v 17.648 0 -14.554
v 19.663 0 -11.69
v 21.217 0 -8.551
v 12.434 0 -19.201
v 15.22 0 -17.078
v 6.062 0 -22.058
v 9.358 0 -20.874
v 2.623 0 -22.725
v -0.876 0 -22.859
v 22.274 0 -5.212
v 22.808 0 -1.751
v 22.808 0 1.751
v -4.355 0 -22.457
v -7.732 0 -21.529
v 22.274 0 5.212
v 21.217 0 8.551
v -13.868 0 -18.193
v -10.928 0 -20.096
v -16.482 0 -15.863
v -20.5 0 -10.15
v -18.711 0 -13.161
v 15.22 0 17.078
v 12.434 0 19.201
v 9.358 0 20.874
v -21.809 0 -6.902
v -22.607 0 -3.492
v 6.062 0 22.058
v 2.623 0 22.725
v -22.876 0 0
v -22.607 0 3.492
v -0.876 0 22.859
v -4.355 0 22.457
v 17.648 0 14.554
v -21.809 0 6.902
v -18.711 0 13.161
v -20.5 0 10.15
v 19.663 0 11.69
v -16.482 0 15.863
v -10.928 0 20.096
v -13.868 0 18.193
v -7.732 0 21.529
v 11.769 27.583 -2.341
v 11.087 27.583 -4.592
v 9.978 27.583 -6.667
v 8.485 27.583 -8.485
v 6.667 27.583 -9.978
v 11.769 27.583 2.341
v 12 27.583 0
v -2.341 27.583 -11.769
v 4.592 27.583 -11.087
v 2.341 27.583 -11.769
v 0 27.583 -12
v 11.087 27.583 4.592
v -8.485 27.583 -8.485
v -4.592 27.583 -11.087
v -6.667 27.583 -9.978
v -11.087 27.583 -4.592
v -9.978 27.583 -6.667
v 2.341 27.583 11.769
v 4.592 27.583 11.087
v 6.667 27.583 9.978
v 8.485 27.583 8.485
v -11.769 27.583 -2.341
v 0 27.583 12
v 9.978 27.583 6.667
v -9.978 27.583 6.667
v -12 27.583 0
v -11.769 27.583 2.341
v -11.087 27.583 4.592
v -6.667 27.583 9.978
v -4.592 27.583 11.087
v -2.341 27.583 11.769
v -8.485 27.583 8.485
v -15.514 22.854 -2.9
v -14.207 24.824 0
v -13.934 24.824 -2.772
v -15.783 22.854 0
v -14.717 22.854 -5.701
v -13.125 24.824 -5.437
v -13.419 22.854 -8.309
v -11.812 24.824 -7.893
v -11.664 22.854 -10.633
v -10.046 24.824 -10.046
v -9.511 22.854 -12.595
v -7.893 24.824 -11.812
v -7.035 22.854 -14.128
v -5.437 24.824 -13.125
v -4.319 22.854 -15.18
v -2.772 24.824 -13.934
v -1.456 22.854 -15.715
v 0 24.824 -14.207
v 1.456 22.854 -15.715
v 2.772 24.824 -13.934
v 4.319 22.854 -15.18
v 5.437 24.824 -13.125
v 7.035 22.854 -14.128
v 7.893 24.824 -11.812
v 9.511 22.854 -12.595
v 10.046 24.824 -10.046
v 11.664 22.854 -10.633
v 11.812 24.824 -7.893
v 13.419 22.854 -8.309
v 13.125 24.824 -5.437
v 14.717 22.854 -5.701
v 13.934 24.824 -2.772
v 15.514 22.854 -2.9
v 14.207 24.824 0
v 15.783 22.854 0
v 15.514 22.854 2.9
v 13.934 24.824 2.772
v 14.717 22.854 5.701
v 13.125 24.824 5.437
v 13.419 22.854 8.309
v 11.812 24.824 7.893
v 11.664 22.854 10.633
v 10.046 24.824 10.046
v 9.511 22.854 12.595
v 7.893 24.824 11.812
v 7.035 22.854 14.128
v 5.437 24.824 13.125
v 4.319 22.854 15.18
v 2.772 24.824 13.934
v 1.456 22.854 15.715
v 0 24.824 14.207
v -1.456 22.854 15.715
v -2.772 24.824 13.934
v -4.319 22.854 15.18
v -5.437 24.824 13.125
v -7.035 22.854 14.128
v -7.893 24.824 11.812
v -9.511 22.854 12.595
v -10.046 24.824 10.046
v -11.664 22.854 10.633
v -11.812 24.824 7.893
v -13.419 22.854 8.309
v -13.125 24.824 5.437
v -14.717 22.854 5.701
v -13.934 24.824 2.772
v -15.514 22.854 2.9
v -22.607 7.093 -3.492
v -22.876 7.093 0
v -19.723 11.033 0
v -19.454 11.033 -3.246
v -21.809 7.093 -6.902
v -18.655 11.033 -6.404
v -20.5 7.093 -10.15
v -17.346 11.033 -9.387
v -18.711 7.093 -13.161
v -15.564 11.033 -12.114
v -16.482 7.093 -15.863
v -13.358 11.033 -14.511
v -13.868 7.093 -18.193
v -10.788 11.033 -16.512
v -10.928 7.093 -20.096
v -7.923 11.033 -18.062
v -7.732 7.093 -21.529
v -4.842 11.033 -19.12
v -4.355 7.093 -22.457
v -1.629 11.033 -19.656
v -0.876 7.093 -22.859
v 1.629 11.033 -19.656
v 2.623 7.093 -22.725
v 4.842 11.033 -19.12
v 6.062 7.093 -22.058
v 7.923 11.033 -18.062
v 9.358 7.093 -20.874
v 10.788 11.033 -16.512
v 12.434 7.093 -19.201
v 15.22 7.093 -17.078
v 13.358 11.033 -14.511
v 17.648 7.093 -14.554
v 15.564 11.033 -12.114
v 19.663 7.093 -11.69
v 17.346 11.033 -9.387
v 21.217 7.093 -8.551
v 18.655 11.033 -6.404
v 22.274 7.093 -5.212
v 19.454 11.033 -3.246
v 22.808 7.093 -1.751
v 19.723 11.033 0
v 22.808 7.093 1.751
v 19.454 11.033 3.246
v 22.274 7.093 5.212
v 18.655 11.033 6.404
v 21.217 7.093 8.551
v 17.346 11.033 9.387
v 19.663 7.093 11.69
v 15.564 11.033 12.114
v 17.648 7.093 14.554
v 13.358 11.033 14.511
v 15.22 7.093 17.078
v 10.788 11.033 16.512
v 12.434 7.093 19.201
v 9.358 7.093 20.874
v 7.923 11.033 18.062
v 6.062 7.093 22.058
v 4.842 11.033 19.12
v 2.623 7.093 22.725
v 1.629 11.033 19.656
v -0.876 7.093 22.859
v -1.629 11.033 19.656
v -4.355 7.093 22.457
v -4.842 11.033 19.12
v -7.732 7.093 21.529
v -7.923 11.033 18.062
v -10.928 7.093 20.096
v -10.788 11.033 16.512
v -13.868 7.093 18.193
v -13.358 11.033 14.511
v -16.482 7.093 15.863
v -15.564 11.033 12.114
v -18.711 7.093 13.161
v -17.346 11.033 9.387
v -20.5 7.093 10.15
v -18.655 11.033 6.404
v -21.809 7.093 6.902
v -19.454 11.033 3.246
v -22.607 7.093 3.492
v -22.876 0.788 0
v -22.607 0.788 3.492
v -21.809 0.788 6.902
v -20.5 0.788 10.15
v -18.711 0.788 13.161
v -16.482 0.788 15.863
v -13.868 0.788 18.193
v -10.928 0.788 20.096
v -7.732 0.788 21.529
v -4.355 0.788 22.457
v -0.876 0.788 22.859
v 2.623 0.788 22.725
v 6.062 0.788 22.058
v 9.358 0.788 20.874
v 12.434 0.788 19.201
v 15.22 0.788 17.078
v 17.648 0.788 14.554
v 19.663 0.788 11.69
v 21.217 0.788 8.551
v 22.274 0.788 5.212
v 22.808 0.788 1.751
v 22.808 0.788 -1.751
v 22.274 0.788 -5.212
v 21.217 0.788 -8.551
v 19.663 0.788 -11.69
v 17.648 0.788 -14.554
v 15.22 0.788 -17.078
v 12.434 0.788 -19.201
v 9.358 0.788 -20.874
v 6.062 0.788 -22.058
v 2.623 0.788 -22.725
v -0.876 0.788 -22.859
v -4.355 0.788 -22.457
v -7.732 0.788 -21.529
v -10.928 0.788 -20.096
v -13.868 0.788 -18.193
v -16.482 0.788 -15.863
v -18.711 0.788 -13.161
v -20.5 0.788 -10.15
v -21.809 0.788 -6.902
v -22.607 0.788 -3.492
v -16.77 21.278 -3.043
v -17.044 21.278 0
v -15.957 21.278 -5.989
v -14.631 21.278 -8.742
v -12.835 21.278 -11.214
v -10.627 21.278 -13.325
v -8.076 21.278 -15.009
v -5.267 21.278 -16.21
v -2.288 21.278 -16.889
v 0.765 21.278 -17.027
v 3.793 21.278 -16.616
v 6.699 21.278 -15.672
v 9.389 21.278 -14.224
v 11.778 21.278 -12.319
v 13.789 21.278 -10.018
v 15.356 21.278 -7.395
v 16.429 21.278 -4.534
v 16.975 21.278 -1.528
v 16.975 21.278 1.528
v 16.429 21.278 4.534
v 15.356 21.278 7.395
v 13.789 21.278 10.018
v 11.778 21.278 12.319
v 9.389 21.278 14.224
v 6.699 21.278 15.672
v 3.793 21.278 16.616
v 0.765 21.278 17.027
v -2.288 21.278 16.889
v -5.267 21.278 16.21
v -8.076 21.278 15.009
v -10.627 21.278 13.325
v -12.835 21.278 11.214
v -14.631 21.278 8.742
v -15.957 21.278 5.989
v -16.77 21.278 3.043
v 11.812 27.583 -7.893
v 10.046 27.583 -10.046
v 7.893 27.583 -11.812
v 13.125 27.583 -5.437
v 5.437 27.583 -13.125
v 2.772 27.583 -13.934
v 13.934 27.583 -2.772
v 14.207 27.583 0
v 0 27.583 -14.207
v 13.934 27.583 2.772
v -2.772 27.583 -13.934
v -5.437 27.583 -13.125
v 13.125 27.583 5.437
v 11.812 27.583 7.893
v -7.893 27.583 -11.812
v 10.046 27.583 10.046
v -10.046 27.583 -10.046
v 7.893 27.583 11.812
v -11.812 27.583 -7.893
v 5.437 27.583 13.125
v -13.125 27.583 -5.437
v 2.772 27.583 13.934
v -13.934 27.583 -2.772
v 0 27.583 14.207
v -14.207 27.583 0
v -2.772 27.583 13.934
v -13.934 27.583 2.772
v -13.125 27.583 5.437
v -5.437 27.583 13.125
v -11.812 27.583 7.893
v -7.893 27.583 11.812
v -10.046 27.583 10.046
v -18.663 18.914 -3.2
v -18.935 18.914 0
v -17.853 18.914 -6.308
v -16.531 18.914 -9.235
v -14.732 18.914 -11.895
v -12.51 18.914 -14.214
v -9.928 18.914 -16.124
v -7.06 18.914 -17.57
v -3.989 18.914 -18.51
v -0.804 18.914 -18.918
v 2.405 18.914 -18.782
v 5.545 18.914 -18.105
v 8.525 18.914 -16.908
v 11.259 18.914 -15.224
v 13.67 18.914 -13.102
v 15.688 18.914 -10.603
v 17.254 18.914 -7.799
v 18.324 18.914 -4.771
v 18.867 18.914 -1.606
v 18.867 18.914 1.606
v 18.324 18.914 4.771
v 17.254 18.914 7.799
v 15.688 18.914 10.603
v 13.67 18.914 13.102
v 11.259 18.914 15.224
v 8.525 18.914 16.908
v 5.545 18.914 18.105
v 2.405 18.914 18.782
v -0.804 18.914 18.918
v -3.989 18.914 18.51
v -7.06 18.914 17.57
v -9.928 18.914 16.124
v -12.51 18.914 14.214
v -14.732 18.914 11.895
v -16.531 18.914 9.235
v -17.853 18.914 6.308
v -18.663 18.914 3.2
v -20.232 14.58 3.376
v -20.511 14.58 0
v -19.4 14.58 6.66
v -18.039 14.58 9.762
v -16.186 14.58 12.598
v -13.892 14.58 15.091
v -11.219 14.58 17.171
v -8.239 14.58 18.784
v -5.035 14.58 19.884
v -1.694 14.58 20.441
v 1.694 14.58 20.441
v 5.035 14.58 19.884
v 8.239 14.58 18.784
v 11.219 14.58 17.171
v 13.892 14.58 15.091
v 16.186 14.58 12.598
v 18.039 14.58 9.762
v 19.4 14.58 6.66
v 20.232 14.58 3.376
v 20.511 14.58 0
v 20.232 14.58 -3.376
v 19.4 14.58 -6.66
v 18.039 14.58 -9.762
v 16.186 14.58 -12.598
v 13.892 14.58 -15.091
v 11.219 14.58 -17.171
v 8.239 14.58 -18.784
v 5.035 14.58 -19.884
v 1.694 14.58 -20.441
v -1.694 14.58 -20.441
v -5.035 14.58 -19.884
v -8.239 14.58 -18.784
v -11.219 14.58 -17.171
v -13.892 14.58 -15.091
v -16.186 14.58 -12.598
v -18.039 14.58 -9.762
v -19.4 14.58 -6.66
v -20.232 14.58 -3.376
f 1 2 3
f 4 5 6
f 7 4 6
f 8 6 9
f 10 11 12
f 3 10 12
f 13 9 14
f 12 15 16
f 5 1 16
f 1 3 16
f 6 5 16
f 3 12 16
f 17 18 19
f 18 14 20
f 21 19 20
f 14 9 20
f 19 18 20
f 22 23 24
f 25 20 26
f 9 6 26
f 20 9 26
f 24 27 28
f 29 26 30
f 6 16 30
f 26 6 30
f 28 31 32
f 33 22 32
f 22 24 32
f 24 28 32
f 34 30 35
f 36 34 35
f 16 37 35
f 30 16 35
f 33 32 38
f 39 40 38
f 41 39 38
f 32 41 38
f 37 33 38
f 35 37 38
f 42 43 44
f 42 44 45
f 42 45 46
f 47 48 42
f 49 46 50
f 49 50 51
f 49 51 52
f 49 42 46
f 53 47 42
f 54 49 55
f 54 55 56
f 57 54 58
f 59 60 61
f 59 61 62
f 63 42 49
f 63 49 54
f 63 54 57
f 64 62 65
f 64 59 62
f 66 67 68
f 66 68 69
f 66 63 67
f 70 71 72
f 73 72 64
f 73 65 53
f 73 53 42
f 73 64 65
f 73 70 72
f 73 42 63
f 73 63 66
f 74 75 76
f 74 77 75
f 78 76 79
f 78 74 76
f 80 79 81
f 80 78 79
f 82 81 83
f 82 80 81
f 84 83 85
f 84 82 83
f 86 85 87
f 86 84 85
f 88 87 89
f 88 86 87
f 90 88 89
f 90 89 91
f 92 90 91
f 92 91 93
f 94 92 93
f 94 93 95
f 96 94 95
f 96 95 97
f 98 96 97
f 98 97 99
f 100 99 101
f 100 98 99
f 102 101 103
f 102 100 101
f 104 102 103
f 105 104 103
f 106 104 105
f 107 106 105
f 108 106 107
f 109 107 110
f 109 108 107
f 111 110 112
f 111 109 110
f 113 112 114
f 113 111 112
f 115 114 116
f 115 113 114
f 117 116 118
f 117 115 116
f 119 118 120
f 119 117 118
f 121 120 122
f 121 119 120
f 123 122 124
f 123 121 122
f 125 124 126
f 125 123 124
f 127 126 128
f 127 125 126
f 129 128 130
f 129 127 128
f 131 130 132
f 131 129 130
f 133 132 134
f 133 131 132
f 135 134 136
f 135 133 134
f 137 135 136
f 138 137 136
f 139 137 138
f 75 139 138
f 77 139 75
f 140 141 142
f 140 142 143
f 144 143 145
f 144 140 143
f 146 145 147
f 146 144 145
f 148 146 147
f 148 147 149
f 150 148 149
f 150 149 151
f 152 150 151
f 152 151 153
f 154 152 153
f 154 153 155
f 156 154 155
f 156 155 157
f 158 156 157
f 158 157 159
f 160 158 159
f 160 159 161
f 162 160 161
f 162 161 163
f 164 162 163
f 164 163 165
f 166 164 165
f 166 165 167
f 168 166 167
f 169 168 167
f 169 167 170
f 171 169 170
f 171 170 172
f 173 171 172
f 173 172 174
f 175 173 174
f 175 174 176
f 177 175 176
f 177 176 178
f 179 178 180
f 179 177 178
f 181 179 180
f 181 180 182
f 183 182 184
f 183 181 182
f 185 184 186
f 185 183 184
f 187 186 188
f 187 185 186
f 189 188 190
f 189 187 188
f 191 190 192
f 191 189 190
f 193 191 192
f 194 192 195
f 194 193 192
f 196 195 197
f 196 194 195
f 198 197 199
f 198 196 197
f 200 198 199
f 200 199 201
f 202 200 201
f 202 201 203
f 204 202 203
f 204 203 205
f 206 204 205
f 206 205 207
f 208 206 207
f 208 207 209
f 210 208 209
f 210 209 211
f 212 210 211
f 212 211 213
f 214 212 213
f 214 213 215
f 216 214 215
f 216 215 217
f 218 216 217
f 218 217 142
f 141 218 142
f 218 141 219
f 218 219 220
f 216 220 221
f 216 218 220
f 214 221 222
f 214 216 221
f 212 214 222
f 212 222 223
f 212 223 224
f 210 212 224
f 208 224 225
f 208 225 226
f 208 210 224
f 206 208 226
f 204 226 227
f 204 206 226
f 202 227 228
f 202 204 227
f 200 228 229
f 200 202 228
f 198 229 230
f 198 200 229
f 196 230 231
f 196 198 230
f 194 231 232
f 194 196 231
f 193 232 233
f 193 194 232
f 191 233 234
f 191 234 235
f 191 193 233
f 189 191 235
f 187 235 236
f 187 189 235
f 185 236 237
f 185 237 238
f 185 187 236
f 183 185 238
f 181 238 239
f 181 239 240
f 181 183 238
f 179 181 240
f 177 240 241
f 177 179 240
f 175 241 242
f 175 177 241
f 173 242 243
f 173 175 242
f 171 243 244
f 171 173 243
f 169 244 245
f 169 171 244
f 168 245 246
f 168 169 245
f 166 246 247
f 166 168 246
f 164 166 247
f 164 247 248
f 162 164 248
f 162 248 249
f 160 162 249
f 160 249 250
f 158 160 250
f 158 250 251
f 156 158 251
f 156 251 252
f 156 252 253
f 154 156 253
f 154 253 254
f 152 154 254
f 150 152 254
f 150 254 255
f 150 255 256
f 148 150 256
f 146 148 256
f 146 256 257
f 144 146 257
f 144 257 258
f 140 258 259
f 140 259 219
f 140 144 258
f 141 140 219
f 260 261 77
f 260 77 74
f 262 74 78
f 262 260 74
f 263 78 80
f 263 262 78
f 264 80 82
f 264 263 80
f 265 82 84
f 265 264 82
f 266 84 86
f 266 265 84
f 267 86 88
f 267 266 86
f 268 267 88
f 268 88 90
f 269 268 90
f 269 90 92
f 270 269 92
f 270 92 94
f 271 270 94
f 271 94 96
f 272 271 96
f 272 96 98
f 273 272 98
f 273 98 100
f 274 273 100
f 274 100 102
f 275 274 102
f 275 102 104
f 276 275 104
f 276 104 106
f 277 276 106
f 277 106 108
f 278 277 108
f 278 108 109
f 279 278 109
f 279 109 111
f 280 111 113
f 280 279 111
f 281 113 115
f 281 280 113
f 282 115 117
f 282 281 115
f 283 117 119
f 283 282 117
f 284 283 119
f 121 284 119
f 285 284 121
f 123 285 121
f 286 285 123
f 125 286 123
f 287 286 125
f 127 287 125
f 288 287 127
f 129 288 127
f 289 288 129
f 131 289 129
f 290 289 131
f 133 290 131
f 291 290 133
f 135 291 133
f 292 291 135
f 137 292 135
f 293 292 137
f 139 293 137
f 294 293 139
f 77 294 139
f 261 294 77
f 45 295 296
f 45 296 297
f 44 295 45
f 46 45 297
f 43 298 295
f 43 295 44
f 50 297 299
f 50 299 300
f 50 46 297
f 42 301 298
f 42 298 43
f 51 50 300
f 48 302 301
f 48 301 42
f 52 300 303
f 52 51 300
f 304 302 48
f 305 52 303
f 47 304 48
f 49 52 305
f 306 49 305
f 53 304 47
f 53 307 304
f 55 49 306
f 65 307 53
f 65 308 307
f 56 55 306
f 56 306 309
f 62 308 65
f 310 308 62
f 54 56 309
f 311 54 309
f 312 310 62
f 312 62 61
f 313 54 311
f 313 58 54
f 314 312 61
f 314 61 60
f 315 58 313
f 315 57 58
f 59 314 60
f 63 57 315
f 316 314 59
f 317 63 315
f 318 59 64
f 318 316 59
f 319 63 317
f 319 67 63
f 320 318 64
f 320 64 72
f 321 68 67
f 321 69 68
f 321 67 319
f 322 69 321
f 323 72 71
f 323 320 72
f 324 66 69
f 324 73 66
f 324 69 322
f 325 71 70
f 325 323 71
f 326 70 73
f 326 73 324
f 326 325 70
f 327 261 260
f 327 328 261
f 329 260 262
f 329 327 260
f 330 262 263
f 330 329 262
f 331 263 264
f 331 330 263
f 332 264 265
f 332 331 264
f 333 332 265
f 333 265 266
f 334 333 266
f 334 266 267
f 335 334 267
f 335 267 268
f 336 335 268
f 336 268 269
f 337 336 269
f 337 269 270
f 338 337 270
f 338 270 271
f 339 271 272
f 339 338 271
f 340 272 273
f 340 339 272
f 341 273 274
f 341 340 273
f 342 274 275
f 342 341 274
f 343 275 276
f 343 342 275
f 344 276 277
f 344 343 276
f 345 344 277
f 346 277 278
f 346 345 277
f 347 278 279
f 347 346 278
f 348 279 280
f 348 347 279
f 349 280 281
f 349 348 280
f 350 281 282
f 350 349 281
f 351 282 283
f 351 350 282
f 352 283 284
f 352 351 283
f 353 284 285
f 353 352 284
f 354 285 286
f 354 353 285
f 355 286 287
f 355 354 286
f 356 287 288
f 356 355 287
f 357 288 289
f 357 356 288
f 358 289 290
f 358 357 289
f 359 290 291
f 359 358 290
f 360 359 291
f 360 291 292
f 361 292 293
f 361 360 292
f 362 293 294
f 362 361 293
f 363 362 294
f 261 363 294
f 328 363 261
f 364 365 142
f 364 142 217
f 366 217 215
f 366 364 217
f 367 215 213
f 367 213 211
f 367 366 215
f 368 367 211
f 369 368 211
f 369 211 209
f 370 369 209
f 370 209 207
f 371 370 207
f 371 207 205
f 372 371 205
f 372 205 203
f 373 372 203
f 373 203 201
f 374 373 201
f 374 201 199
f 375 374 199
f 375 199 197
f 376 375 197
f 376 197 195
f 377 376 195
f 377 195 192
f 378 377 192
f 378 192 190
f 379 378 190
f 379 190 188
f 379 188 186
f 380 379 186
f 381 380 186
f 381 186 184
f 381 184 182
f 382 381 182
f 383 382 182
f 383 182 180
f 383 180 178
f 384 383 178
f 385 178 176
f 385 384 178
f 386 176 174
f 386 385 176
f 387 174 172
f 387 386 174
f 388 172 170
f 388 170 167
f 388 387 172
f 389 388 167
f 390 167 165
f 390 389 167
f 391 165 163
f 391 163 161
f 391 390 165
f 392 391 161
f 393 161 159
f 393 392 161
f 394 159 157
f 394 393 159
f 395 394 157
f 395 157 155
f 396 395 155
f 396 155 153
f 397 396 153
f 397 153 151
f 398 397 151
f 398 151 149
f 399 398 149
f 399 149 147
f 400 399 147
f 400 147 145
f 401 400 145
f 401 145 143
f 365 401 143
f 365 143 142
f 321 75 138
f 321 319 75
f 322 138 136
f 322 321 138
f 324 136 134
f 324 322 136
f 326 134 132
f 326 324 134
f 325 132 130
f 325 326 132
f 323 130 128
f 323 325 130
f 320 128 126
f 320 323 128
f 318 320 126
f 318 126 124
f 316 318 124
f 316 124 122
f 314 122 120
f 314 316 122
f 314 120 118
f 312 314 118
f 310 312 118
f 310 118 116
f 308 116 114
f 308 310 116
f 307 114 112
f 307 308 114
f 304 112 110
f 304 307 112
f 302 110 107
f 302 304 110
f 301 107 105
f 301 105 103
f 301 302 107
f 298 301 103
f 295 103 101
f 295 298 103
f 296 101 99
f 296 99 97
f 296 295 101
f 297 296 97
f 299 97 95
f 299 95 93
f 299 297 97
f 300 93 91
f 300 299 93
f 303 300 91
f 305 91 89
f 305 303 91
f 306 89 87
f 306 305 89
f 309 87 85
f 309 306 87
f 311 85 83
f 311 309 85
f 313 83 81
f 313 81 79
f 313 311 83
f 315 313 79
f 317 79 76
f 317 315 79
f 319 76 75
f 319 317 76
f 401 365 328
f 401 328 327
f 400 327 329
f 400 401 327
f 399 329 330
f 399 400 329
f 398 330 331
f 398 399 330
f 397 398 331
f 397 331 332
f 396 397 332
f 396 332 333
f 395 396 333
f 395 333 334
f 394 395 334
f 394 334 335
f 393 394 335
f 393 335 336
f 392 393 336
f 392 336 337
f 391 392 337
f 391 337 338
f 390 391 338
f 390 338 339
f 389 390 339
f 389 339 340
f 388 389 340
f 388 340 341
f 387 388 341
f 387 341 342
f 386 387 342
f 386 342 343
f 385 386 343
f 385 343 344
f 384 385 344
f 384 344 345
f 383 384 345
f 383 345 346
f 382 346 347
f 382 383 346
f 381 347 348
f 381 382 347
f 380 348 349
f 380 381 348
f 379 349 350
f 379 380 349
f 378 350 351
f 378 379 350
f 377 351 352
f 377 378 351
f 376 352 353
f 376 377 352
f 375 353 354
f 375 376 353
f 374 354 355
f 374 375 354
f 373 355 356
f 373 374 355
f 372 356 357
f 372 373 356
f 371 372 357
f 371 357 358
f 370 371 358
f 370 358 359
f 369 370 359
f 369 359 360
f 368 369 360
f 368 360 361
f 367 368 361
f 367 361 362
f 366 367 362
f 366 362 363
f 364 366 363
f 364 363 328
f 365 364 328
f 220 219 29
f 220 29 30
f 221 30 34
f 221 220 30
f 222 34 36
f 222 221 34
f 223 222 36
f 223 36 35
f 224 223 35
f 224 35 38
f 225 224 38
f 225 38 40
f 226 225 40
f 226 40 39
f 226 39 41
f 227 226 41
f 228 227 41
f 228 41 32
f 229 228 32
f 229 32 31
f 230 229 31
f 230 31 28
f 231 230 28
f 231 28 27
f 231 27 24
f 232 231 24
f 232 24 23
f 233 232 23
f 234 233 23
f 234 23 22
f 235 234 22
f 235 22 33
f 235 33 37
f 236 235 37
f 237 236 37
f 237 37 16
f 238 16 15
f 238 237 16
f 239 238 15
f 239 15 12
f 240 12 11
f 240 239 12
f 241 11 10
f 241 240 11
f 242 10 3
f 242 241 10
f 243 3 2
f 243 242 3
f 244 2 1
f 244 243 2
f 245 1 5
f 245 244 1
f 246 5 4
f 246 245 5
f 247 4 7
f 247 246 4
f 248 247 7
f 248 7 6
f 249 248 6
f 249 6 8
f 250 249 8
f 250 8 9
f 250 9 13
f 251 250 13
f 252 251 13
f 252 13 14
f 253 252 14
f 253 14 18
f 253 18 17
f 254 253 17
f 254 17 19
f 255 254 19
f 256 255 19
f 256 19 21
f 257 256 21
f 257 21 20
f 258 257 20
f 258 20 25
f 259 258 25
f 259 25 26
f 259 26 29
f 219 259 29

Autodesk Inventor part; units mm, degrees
ref_plane "YZ Plane" through (0, 0, 0) normal (1, 0, 0) x (0, 1, 0)
ref_plane "XZ Plane" through (0, 0, 0) normal (0, 1, 0) x (-1, 0, 0)
ref_plane "XY Plane" through (0, 0, 0) normal (0, 0, 1) x (1, 0, 0)
sketch "Boceto2" plane through (0, 0, 0) normal (0, 0, 1) x (1, 0, 0)
  line L0 (-55.132, 97.6233) -> (57.4508, 97.6233) construction
  line L1 (57.4508, 97.6233) -> (57.4508, -13.0832) construction
  line L2 (57.4508, -13.0832) -> (-55.132, -13.0832) construction
  line L3 (-55.132, -13.0832) -> (-55.132, 97.6233) construction
  line L4 (0, 0) -> (0, 27.5828)
  line L5 (0, 27.5828) -> (0, 0)
  line L6 (-22.8755, 0.7881) -> (-22.8755, 7.0927)
  line L7 (-22.8755, 7.0927) -> (-19.7232, 11.0331)
  line L8 (-19.7232, 11.0331) -> (-20.5113, 14.5795)
  line L9 (-20.5113, 14.5795) -> (-18.9351, 18.9139)
  line L10 (-18.9351, 18.9139) -> (-17.0437, 21.2782)
  line L11 (-17.0437, 21.2782) -> (-15.7828, 22.8543)
  line L12 (-15.7828, 22.8543) -> (-14.2066, 24.8245)
  line L13 (-14.2066, 24.8245) -> (-14.2066, 27.5828)
  line L14 (-14.2066, 27.5828) -> (-12, 27.5828)
  line L15 (0, 27.5828) -> (-12, 27.5828)
  line L16 (-14.2066, 27.5828) -> (-12, 27.5828)
  line L17 (0, 0) -> (-22.8755, 0)
  line L18 (-22.8755, 0) -> (-22.8755, 0.7881)
  dimension "d18" = 12
revolve "Revolución1" add sketch "Boceto2" angle 360 about axis through (0, 0, 0) along (0, 1, 0)
properties part number "KINGHT BASE  medieum 1.0"
